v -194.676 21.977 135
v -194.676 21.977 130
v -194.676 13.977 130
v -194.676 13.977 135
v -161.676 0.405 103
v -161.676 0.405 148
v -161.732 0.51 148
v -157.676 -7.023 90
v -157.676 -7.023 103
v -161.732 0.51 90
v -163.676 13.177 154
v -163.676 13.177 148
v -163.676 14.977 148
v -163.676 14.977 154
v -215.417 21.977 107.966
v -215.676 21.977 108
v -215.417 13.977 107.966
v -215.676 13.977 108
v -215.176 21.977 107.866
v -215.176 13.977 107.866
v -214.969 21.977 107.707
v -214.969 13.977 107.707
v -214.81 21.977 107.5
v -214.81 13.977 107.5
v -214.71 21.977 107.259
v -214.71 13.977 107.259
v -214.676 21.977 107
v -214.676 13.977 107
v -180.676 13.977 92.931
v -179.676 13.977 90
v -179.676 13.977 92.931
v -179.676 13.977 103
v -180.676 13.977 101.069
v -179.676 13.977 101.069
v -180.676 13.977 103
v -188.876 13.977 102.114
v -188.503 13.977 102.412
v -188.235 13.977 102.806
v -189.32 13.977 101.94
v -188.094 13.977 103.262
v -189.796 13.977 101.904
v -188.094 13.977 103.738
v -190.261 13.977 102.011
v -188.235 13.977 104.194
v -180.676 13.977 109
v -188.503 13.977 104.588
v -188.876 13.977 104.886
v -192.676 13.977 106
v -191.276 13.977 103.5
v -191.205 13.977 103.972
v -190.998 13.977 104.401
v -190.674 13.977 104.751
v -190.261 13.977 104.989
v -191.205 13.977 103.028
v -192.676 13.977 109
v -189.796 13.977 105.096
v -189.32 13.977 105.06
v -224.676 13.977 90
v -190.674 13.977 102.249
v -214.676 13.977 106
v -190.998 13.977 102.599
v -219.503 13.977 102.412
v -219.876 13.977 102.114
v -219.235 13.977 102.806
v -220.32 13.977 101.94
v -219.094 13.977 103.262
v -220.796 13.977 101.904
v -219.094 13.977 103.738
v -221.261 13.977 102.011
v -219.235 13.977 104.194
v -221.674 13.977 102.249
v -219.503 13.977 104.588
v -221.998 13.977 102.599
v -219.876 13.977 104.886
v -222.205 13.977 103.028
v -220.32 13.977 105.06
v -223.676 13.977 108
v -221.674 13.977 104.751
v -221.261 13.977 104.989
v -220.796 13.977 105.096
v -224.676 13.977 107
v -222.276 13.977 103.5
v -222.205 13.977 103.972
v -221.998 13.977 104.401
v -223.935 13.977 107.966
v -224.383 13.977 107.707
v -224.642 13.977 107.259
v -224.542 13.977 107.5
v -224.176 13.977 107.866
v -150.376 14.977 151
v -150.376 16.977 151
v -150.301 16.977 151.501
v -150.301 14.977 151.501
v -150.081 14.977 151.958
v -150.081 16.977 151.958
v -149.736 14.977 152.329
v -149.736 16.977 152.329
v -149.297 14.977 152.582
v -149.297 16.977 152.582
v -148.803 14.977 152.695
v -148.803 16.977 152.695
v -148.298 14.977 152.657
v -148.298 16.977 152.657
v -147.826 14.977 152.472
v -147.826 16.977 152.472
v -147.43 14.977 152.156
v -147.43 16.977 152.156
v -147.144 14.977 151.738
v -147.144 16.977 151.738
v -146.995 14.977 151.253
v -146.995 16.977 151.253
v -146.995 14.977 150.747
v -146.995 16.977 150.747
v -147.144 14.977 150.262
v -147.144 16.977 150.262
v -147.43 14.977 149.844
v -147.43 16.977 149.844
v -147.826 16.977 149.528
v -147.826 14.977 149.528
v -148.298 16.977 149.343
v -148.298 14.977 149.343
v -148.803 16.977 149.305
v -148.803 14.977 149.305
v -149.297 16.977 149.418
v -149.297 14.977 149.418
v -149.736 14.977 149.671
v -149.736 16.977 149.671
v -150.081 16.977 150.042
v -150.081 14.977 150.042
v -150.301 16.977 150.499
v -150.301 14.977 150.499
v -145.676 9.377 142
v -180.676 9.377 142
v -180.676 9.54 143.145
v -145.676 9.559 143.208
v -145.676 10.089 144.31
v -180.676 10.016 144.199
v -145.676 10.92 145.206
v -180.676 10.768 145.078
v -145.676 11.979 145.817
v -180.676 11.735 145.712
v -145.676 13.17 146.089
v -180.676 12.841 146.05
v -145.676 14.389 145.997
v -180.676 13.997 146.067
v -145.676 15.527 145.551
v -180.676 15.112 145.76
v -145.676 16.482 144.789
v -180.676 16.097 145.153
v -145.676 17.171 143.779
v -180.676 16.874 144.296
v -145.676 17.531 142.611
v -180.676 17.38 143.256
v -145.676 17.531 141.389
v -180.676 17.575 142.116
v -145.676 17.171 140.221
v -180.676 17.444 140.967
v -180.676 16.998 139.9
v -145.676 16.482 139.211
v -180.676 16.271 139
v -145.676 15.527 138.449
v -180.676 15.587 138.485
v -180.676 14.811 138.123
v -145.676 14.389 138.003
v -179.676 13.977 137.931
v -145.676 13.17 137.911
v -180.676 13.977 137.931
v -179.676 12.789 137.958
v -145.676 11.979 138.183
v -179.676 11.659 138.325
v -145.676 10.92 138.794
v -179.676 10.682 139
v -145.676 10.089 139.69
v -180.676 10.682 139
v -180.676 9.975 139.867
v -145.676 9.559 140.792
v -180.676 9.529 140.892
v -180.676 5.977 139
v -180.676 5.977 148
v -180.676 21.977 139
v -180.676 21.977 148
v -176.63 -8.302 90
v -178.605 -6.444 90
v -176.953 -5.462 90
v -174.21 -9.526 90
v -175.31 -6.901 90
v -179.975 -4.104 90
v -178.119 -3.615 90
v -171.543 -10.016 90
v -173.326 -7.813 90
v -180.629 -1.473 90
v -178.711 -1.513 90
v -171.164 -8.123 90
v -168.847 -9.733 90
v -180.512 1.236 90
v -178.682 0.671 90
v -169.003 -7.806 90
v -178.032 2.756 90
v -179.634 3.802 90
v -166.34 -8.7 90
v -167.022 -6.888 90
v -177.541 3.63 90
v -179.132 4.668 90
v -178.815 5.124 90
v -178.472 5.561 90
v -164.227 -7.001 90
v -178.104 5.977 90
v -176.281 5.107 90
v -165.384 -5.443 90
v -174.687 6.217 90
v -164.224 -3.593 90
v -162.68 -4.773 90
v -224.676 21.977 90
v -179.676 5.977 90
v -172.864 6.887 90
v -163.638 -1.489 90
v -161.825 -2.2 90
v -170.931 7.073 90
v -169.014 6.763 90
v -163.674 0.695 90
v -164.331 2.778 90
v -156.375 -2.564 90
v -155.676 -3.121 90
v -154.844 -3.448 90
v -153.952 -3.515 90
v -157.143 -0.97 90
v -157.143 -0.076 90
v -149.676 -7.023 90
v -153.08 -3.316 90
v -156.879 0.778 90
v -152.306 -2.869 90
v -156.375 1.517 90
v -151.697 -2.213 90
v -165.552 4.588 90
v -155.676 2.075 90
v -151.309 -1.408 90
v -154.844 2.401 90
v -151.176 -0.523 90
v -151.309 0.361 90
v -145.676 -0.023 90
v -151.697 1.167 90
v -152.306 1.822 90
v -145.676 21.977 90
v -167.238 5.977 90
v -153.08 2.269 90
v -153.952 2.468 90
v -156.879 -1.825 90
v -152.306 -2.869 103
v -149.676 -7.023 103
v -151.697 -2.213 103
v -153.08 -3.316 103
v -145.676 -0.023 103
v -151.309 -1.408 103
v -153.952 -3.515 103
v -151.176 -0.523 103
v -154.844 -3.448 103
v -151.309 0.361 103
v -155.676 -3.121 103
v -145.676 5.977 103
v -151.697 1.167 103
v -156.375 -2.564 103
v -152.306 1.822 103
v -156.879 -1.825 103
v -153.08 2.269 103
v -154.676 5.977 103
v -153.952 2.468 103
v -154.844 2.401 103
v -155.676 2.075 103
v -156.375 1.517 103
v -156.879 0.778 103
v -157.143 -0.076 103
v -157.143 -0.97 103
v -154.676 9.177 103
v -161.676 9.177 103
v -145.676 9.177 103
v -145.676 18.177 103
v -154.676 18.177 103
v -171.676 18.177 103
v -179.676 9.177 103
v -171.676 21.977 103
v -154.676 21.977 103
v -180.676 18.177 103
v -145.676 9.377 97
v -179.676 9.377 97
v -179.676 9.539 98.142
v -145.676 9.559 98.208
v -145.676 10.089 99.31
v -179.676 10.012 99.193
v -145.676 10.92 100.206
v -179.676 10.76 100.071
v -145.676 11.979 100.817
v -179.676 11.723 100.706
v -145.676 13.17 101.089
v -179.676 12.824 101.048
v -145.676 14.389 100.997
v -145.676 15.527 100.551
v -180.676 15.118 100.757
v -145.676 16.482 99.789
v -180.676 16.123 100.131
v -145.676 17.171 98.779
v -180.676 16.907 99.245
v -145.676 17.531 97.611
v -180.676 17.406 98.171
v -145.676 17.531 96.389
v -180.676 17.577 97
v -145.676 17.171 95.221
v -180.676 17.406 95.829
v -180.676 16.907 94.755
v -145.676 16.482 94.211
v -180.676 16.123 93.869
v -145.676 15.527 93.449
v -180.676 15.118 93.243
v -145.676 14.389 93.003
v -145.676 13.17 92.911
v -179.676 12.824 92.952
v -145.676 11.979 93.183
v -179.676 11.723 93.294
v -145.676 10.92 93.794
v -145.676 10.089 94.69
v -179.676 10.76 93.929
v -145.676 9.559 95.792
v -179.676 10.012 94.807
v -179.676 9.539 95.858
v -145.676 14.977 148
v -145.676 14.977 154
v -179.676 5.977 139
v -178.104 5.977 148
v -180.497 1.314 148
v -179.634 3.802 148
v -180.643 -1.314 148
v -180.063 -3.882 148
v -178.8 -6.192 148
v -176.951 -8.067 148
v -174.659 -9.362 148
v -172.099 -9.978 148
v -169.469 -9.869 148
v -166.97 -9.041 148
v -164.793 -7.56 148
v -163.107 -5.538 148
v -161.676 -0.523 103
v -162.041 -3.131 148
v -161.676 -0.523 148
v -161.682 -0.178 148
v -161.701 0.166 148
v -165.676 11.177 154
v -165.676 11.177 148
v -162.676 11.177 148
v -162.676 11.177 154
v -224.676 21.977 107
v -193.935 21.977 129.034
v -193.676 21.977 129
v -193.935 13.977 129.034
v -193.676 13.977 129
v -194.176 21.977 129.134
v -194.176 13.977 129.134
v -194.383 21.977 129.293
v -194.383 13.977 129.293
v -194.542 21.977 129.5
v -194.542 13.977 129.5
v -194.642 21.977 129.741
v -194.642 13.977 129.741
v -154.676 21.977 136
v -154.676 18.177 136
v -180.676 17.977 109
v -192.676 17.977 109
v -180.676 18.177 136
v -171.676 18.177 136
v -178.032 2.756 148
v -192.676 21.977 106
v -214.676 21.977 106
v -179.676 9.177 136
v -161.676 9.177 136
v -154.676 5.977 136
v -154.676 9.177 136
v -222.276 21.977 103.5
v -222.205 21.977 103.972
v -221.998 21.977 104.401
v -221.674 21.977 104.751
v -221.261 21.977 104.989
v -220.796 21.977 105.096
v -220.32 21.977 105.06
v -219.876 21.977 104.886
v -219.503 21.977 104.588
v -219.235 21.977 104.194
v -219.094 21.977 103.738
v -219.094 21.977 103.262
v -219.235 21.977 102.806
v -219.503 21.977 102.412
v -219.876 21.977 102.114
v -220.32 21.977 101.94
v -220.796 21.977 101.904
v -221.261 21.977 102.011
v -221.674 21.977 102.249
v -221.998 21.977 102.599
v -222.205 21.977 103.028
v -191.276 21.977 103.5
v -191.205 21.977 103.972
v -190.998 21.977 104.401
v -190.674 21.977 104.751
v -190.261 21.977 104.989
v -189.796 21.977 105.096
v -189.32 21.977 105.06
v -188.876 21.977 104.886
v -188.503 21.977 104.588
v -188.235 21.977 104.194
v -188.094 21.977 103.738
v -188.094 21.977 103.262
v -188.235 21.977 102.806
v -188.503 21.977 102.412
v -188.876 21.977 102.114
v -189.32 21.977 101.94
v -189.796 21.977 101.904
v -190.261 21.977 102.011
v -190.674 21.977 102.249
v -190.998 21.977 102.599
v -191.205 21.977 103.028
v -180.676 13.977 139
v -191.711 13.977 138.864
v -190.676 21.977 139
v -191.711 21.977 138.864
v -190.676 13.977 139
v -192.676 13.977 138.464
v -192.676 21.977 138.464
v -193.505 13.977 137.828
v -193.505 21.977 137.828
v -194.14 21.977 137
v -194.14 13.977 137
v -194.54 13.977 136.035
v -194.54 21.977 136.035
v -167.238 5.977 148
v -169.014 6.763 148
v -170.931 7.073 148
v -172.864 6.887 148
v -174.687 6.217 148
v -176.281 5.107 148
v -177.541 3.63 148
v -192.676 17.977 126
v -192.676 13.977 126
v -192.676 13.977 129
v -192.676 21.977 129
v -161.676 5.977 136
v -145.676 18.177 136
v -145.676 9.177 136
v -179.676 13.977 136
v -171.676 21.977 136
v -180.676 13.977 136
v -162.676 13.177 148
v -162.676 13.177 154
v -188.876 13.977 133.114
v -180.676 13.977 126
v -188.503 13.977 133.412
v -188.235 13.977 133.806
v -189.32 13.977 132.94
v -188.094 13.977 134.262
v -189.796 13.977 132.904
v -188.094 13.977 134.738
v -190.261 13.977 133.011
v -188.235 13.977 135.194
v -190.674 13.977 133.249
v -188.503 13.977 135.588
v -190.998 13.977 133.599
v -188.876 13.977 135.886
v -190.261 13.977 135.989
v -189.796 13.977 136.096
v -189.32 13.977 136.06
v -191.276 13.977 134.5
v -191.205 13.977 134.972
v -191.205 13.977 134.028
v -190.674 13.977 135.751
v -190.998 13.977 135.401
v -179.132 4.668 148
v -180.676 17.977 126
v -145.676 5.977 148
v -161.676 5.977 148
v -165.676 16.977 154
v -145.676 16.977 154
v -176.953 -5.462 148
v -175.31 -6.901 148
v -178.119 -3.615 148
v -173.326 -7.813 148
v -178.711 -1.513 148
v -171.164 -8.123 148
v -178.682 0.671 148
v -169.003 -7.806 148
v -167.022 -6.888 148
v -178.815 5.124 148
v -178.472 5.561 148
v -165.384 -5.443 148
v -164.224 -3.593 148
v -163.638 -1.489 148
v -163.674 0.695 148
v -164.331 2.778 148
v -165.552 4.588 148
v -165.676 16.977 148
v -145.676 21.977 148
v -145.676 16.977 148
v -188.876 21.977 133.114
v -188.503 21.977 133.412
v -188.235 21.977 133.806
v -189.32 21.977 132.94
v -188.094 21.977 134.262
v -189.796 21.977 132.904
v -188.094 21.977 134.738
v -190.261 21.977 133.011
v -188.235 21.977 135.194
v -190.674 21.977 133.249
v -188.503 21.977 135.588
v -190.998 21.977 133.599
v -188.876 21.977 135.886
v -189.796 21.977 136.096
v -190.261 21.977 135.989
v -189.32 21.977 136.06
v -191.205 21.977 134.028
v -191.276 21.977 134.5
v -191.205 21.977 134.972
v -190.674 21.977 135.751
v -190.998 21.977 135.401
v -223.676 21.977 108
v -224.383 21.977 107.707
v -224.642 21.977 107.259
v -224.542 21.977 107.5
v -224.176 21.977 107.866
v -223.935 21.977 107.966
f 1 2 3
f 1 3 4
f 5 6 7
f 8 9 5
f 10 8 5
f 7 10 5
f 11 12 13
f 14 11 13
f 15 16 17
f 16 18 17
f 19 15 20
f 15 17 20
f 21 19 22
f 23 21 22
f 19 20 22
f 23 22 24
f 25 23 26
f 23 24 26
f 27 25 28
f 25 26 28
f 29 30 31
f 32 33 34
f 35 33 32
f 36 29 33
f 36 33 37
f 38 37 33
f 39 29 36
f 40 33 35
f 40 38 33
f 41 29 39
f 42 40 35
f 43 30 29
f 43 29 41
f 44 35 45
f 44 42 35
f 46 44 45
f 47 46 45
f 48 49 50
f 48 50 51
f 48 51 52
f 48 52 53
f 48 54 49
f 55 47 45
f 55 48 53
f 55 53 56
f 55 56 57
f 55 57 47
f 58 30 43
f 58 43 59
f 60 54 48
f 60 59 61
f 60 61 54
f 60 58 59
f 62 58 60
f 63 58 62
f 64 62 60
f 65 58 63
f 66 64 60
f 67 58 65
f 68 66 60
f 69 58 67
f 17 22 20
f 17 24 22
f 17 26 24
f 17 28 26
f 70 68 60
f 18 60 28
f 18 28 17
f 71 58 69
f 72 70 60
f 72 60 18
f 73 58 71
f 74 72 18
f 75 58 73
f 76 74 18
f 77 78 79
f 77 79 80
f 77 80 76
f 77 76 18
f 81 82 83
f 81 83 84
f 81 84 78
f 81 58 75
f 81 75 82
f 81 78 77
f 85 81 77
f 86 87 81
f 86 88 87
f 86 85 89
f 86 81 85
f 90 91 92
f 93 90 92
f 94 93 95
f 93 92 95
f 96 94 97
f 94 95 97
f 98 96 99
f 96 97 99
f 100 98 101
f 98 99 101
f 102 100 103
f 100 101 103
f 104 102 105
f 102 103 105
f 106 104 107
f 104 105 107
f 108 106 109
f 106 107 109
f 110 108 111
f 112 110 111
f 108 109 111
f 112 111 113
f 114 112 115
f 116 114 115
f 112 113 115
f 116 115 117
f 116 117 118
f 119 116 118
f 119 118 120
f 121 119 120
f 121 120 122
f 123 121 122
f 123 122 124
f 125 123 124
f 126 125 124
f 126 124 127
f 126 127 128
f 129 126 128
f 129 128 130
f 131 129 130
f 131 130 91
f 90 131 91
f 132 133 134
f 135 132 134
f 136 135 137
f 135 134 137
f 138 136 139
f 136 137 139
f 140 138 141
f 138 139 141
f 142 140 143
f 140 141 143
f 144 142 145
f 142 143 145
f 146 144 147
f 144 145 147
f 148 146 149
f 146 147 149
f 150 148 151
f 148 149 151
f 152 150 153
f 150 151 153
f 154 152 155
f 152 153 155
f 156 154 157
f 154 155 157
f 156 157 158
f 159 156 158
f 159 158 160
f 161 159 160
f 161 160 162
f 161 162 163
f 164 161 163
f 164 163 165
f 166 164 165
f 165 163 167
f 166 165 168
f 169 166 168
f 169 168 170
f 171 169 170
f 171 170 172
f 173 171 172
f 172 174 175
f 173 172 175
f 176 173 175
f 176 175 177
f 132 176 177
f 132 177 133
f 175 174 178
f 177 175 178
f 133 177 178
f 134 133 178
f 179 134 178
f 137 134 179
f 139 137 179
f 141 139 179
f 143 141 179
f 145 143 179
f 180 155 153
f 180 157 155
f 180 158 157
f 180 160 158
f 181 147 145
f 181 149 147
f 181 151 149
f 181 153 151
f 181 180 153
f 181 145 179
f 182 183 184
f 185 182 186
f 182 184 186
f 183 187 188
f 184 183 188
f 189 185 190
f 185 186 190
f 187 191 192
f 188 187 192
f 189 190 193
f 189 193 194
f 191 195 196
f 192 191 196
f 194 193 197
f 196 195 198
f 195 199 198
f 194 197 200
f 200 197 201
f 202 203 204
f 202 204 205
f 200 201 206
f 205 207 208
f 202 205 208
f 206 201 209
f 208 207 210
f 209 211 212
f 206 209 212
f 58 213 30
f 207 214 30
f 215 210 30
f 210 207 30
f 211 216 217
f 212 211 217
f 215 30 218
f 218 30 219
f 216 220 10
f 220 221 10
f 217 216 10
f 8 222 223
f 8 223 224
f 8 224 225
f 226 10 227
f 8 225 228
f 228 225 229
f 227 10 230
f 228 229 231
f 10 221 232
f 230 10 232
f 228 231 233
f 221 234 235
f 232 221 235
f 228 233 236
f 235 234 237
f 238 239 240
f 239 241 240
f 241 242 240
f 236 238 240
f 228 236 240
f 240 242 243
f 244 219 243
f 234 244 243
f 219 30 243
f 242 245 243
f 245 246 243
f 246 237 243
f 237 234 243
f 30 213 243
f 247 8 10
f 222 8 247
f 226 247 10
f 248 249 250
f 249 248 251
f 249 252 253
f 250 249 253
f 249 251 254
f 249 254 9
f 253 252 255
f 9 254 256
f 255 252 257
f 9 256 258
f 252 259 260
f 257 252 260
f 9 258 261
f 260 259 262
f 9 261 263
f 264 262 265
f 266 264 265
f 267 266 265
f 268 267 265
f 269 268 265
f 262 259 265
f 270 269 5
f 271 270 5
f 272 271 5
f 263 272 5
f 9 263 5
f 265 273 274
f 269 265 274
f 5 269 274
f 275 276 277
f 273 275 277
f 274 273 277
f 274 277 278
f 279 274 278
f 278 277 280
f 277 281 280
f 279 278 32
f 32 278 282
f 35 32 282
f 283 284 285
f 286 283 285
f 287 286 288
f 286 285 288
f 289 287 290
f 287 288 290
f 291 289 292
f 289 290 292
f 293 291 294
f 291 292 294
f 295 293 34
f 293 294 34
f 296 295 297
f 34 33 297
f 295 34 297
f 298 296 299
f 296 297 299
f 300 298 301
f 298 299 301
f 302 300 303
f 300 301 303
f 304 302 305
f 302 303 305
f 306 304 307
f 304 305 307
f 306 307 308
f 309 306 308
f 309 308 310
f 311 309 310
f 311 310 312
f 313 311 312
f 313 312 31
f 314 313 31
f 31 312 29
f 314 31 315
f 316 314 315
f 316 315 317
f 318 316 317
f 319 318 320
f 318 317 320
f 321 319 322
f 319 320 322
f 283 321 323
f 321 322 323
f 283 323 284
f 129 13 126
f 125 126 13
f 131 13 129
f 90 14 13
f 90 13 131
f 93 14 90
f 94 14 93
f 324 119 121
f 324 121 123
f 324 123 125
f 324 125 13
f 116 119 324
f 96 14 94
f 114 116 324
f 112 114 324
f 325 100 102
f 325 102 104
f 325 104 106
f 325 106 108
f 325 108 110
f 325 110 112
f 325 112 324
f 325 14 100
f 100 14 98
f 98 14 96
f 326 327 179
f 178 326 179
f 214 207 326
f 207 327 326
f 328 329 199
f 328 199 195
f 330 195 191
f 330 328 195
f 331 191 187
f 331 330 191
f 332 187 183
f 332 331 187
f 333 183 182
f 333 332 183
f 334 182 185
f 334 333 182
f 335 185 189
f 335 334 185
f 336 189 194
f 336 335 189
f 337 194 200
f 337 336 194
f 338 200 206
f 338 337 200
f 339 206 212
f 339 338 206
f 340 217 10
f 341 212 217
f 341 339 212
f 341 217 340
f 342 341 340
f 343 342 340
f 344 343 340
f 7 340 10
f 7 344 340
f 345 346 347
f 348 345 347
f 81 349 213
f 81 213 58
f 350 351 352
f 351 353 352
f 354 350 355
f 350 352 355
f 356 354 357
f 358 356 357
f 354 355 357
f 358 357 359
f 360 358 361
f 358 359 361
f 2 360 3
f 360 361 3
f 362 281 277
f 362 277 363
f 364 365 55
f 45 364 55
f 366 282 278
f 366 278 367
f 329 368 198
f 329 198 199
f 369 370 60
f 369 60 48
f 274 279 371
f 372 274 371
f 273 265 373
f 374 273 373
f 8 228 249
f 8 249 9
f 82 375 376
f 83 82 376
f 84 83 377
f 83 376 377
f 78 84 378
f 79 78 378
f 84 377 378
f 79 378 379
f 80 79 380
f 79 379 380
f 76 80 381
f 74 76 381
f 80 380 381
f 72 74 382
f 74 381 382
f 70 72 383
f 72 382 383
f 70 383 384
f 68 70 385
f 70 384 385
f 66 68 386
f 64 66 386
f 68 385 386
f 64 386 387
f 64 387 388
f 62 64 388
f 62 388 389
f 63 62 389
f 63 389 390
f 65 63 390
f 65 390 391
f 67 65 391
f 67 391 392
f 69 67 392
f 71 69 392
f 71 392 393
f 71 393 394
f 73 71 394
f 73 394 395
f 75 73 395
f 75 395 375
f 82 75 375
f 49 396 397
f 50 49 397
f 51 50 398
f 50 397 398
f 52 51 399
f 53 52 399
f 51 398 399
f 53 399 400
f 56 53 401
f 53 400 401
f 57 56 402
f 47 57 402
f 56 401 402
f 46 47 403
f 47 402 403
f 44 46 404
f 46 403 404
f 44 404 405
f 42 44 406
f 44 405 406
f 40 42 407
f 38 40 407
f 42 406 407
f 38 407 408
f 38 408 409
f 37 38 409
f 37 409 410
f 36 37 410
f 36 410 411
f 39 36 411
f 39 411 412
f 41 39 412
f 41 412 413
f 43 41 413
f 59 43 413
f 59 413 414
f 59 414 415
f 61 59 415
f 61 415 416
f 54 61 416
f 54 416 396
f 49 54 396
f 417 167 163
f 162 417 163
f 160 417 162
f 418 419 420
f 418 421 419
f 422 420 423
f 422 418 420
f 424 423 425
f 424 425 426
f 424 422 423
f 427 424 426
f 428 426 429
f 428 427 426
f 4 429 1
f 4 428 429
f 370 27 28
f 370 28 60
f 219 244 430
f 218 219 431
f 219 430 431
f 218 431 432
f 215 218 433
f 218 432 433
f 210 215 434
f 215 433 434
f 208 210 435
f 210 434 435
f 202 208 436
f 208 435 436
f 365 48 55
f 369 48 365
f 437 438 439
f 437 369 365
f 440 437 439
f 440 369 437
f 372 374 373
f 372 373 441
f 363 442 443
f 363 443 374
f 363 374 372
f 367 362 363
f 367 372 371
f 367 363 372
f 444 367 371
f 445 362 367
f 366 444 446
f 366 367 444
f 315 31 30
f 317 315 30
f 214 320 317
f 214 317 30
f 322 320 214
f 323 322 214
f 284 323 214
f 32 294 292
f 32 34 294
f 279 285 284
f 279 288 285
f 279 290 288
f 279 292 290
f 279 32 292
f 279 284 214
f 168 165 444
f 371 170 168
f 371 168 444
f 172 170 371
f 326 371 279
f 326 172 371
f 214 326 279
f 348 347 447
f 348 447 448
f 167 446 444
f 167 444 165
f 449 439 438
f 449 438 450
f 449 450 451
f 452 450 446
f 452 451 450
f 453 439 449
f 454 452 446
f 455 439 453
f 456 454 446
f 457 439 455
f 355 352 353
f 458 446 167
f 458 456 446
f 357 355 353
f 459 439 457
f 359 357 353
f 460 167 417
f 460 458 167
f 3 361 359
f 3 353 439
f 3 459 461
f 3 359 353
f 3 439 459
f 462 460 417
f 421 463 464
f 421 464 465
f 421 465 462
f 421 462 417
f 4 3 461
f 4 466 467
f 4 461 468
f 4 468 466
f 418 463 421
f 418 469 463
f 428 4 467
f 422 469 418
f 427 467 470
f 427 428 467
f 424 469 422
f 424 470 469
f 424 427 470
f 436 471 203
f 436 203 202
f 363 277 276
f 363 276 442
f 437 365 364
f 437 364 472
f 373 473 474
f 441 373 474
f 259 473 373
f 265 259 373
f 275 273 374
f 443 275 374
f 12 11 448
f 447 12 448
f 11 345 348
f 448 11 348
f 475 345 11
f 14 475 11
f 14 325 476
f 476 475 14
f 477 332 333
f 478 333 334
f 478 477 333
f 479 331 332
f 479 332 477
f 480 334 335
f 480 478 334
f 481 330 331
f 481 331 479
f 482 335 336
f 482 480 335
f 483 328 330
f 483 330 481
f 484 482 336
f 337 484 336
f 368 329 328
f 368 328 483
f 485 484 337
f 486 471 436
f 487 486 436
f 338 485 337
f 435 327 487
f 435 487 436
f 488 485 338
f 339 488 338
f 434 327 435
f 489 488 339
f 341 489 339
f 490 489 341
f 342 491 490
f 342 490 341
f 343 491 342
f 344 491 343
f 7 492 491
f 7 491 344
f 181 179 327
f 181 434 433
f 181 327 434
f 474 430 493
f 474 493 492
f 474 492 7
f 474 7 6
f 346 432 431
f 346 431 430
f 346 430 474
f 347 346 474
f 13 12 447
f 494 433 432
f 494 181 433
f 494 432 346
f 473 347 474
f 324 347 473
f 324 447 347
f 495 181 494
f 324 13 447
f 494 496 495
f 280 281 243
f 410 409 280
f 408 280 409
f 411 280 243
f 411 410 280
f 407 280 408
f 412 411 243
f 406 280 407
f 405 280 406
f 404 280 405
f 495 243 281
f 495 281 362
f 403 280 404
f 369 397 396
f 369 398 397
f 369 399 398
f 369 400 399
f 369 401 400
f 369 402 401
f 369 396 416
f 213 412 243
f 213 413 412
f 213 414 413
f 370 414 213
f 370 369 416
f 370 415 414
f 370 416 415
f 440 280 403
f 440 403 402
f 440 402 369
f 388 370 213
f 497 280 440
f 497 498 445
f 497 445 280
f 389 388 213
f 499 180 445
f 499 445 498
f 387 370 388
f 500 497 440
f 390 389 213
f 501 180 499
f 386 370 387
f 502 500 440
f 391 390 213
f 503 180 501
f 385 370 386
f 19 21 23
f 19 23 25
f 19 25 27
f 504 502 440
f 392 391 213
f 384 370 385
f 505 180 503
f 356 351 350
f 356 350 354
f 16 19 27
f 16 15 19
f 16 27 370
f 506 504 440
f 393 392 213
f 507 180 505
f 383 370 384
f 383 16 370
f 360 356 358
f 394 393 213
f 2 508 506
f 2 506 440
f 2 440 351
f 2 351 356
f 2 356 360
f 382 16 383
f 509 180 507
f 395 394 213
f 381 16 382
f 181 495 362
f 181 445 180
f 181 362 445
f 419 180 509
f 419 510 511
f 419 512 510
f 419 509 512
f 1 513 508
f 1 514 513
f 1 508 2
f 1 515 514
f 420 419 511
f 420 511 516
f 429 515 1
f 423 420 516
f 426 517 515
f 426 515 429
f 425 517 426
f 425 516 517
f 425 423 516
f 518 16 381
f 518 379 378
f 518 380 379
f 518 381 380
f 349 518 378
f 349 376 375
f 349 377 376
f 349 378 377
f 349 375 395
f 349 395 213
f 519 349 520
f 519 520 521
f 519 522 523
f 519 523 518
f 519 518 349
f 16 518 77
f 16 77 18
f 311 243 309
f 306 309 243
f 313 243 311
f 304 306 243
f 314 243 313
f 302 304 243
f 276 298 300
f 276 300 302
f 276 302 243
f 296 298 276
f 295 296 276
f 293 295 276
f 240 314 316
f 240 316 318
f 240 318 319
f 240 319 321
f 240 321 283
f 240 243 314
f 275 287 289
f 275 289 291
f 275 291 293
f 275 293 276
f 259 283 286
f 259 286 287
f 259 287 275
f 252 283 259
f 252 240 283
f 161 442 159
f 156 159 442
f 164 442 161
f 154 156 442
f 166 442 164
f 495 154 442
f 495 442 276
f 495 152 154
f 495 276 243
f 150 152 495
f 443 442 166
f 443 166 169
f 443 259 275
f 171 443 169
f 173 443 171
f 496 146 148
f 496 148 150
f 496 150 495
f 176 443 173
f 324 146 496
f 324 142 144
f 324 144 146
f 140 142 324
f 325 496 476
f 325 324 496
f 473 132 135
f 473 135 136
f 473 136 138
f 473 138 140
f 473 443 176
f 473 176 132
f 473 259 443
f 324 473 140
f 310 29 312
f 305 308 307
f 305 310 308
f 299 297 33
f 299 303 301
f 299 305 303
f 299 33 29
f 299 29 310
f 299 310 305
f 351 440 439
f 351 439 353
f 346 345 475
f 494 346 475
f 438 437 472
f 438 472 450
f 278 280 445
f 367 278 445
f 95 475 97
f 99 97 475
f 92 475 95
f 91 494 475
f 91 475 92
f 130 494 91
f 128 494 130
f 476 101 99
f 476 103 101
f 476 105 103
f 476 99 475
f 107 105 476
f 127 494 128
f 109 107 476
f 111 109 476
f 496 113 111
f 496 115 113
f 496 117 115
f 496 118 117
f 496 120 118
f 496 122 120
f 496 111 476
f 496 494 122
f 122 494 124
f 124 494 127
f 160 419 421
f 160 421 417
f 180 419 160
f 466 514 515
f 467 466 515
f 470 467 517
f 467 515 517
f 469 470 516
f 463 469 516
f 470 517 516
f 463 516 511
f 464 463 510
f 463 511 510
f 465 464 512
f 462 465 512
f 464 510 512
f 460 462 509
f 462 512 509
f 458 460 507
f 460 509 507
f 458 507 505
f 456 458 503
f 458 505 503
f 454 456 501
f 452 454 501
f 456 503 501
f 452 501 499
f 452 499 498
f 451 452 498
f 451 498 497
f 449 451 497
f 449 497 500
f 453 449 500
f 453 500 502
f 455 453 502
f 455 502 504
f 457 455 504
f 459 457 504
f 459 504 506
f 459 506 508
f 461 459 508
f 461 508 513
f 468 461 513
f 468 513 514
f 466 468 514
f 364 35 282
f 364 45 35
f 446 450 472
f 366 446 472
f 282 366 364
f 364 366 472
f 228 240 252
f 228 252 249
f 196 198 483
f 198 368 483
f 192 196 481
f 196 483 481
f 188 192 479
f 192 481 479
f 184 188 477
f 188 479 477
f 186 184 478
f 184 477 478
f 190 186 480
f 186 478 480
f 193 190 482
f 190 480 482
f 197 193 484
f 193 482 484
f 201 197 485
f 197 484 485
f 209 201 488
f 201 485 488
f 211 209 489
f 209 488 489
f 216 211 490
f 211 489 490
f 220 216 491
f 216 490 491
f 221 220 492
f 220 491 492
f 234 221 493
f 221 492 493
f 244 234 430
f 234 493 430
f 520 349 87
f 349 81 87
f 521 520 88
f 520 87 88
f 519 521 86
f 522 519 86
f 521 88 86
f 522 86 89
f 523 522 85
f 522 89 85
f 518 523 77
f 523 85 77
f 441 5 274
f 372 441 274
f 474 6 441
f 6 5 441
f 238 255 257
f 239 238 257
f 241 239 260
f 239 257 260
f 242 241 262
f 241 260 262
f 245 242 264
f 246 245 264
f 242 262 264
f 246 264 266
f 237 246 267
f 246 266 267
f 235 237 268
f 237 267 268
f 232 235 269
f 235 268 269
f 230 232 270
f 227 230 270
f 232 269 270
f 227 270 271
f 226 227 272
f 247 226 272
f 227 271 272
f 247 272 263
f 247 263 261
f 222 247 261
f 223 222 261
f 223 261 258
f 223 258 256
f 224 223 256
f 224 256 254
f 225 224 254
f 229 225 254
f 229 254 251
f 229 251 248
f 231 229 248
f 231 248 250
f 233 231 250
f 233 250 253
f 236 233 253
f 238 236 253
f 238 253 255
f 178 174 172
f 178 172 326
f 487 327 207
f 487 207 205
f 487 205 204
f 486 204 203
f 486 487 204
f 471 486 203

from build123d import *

# Parameters (mm, degrees)
PAD_DEPTH       = 58
SKETCH001_R     = 9.5
SKETCH001_R_2   = 7.6
PAD001_DEPTH    = 58
SKETCH002_R     = 7.6
SKETCH002_R_2   = 3
POCKET_DEPTH    = 58
SKETCH003_R     = 4.1
SKETCH003_W     = 9
SKETCH003_H     = 33
POCKET001_DEPTH = 55
SKETCH004_W     = 16
SKETCH004_H     = 13
POCKET002_DEPTH = 45
PAD002_DEPTH    = 58
SKETCH006_R     = 1.6
POCKET003_DEPTH = 17
SKETCH007_W     = 18
SKETCH007_H     = 58
POCKET004_DEPTH = 25
SKETCH008_W     = 17
SKETCH008_H     = 33
POCKET005_DEPTH = 5
SKETCH009_W     = 7
SKETCH009_H     = 33
POCKET006_DEPTH = 5
SKETCH010_W     = 8
SKETCH010_H     = 49
POCKET007_DEPTH = 45
SKETCH011_W     = 4
SKETCH011_H     = 17
POCKET008_DEPTH = 20
POCKET009_DEPTH = 58
SKETCH013_W     = 20
SKETCH013_H     = 5.8
SKETCH013_W_2   = 17.2
SKETCH013_H_2   = 1.8
PAD003_DEPTH    = 6
SKETCH014_W     = 17
SKETCH014_H     = 6
POCKET010_DEPTH = 3.8
SKETCH015_R     = 1.7
POCKET011_DEPTH = 27.001
FILLET_R        = 1
FILLET001_R     = 4


with BuildPart() as part:
    # Sketch → Pad (new body)
    with BuildSketch(Plane(origin=(-133, 0, 90), x_dir=(1, 0, 0), z_dir=(0, 0, 1))):
        Polygon((-47.676132, 21.976631), (5.323868, 21.976631), (5.323868, 5.976631), (-12.676132, 5.976631), (-12.676132, -0.023369), (-16.676132, -7.023369), (-24.676132, -7.023369), (-31.676132, 5.976631), (-47.676132, 5.976631), align=None)
    extrude(amount=PAD_DEPTH)

    # Sketch001 → Pad001 (new body)
    with BuildSketch(Plane(origin=(-133, 0, 148), x_dir=(1, 0, 0), z_dir=(0, 0, 1))):
        with Locations((-38.176132, -0.523369)):
            Circle(SKETCH001_R)
        with Locations((-38.176132, -0.523369)):
            Circle(SKETCH001_R_2, mode=Mode.SUBTRACT)
    extrude(amount=-PAD001_DEPTH)

    # Sketch002 → Pocket (cut)
    with BuildSketch(Plane(origin=(-133, 0, 148), x_dir=(1, 0, 0), z_dir=(0, 0, 1))):
        with Locations((-38.176132, -0.523369)):
            Circle(SKETCH002_R)
        with Locations((-21.176132, -0.523369)):
            Circle(SKETCH002_R_2)
    extrude(amount=-POCKET_DEPTH, mode=Mode.SUBTRACT)

    # Sketch003 → Pocket001 (cut)
    with BuildSketch(Plane(origin=(-180.676132, 0, 90), x_dir=(0, -1, 0), z_dir=(-1, 0, 0))):
        with Locations((-13.476631, 52)):
            Circle(SKETCH003_R)
        with Locations((-13.476631, 7)):
            Circle(SKETCH003_R)
        with Locations((-13.676631, 29.5)):
            Rectangle(SKETCH003_W, SKETCH003_H)
    extrude(amount=-POCKET001_DEPTH, mode=Mode.SUBTRACT)

    # Sketch004 → Pocket002 (cut)
    with BuildSketch(Plane(origin=(-133, 0, 148), x_dir=(1, 0, 0), z_dir=(0, 0, 1))):
        with Locations((-20.676132, -0.523369)):
            Rectangle(SKETCH004_W, SKETCH004_H)
    extrude(amount=-POCKET002_DEPTH, mode=Mode.SUBTRACT)

    # Sketch005 → Pad002 (new body)
    with BuildSketch(Plane(origin=(-133, 0, 148), x_dir=(1, 0, 0), z_dir=(0, 0, 1))):
        Polygon((-47.676132, 21.976631), (-91.676132, 21.976631), (-91.676132, 11.976631), (-81.676132, 11.976631), (-47.676132, 5.976631), align=None)
    extrude(amount=-PAD002_DEPTH)

    # Sketch006 → Pocket003 (cut)
    with BuildSketch(Plane(origin=(-133, 21.976631, 90), x_dir=(-1, 0, 0), z_dir=(0, 1, 0))):
        with Locations((56.676132, 44.5)):
            Circle(SKETCH006_R)
        with Locations((56.676132, 13.5)):
            Circle(SKETCH006_R)
        with Locations((87.676132, 13.5)):
            Circle(SKETCH006_R)
        Polygon((91.676132, 18), (81.676132, 18), (81.676132, 16), (59.676132, 16), (59.676132, 39), (61.676132, 39), (61.676132, 49), (47.676132, 49), (47.676132, 58), (91.676132, 58), align=None)
    extrude(amount=-POCKET003_DEPTH, mode=Mode.SUBTRACT)

    # Sketch007 → Pocket004 (cut)
    with BuildSketch(Plane(origin=(-133, 5.976631, 90), x_dir=(1, 0, 0), z_dir=(0, -1, 0))):
        with Locations((-3.676132, 29)):
            Rectangle(SKETCH007_W, SKETCH007_H)
    extrude(amount=-POCKET004_DEPTH, mode=Mode.SUBTRACT)

    # Sketch008 → Pocket005 (cut)
    with BuildSketch(Plane(origin=(-133, 21.976631, 90), x_dir=(-1, 0, 0), z_dir=(0, 1, 0))):
        with Locations((30.176132, 29.5)):
            Rectangle(SKETCH008_W, SKETCH008_H)
    extrude(amount=-POCKET005_DEPTH, mode=Mode.SUBTRACT)

    # Sketch009 → Pocket006 (cut)
    with BuildSketch(Plane(origin=(-133, 5.976631, 90), x_dir=(1, 0, 0), z_dir=(0, -1, 0))):
        with Locations((-25.176132, 29.5)):
            Rectangle(SKETCH009_W, SKETCH009_H)
    extrude(amount=-POCKET006_DEPTH, mode=Mode.SUBTRACT)

    # Sketch010 → Pocket007 (cut)
    with BuildSketch(Plane(origin=(-224.676132, 0, 90), x_dir=(0, -1, 0), z_dir=(-1, 0, 0))):
        with Locations((-9.976631, 24.5)):
            Rectangle(SKETCH010_W, SKETCH010_H)
    extrude(amount=-POCKET007_DEPTH, mode=Mode.SUBTRACT)

    # Sketch011 → Pocket008 (cut)
    with BuildSketch(Plane(origin=(-192.676132, 0, 90), x_dir=(0, -1, 0), z_dir=(-1, 0, 0))):
        with Locations((-15.976631, 27.5)):
            Rectangle(SKETCH011_W, SKETCH011_H)
    extrude(amount=-POCKET008_DEPTH, mode=Mode.SUBTRACT)

    # Sketch012 → Pocket009 (cut)
    with BuildSketch(Plane(origin=(-133, 0, 148), x_dir=(1, 0, 0), z_dir=(0, 0, 1))):
        Polygon((-38.722618, -1.360837), (-49.563332, 5.713227), (-49.016846, 6.550695), (-38.176132, -0.523369), align=None)
    extrude(amount=-POCKET009_DEPTH, mode=Mode.SUBTRACT)

    # Sketch013 → Pad003 (new body)
    with BuildSketch(Plane(origin=(-133, 0, 148), x_dir=(1, 0, 0), z_dir=(0, 0, 1))):
        with Locations((-22.676132, 14.076631)):
            Rectangle(SKETCH013_W, SKETCH013_H)
        with Locations((-22.076132, 14.076631)):
            Rectangle(SKETCH013_W_2, SKETCH013_H_2, mode=Mode.SUBTRACT)
    extrude(amount=PAD003_DEPTH)

    # Sketch014 → Pocket010 (cut)
    with BuildSketch(Plane(origin=(-133, 11.176631, 90), x_dir=(1, 0, 0), z_dir=(0, -1, 0))):
        with Locations((-21.176132, 61)):
            Rectangle(SKETCH014_W, SKETCH014_H)
    extrude(amount=-POCKET010_DEPTH, mode=Mode.SUBTRACT)

    # Sketch015 → Pocket011 (cut, through all)
    with BuildSketch(Plane(origin=(-133, 16.976631, 90), x_dir=(-1, 0, 0), z_dir=(0, 1, 0))):
        with Locations((15.676132, 61)):
            Circle(SKETCH015_R)
    extrude(amount=-POCKET011_DEPTH, mode=Mode.SUBTRACT)

    # Fillet
    fillet_edges = [part.edges().sort_by_distance(p)[0] for p in [
        (-224.676132, 17.976631, 108),
        (-194.676132, 17.976631, 129),
        (-214.676132, 17.976631, 108),
    ]]
    fillet(fillet_edges, radius=FILLET_R)

    # Fillet001
    fillet001_edges = [part.edges().sort_by_distance(p)[0] for p in [
        (-194.676132, 17.976631, 139),
    ]]
    fillet(fillet001_edges, radius=FILLET001_R)


solid = part.part
